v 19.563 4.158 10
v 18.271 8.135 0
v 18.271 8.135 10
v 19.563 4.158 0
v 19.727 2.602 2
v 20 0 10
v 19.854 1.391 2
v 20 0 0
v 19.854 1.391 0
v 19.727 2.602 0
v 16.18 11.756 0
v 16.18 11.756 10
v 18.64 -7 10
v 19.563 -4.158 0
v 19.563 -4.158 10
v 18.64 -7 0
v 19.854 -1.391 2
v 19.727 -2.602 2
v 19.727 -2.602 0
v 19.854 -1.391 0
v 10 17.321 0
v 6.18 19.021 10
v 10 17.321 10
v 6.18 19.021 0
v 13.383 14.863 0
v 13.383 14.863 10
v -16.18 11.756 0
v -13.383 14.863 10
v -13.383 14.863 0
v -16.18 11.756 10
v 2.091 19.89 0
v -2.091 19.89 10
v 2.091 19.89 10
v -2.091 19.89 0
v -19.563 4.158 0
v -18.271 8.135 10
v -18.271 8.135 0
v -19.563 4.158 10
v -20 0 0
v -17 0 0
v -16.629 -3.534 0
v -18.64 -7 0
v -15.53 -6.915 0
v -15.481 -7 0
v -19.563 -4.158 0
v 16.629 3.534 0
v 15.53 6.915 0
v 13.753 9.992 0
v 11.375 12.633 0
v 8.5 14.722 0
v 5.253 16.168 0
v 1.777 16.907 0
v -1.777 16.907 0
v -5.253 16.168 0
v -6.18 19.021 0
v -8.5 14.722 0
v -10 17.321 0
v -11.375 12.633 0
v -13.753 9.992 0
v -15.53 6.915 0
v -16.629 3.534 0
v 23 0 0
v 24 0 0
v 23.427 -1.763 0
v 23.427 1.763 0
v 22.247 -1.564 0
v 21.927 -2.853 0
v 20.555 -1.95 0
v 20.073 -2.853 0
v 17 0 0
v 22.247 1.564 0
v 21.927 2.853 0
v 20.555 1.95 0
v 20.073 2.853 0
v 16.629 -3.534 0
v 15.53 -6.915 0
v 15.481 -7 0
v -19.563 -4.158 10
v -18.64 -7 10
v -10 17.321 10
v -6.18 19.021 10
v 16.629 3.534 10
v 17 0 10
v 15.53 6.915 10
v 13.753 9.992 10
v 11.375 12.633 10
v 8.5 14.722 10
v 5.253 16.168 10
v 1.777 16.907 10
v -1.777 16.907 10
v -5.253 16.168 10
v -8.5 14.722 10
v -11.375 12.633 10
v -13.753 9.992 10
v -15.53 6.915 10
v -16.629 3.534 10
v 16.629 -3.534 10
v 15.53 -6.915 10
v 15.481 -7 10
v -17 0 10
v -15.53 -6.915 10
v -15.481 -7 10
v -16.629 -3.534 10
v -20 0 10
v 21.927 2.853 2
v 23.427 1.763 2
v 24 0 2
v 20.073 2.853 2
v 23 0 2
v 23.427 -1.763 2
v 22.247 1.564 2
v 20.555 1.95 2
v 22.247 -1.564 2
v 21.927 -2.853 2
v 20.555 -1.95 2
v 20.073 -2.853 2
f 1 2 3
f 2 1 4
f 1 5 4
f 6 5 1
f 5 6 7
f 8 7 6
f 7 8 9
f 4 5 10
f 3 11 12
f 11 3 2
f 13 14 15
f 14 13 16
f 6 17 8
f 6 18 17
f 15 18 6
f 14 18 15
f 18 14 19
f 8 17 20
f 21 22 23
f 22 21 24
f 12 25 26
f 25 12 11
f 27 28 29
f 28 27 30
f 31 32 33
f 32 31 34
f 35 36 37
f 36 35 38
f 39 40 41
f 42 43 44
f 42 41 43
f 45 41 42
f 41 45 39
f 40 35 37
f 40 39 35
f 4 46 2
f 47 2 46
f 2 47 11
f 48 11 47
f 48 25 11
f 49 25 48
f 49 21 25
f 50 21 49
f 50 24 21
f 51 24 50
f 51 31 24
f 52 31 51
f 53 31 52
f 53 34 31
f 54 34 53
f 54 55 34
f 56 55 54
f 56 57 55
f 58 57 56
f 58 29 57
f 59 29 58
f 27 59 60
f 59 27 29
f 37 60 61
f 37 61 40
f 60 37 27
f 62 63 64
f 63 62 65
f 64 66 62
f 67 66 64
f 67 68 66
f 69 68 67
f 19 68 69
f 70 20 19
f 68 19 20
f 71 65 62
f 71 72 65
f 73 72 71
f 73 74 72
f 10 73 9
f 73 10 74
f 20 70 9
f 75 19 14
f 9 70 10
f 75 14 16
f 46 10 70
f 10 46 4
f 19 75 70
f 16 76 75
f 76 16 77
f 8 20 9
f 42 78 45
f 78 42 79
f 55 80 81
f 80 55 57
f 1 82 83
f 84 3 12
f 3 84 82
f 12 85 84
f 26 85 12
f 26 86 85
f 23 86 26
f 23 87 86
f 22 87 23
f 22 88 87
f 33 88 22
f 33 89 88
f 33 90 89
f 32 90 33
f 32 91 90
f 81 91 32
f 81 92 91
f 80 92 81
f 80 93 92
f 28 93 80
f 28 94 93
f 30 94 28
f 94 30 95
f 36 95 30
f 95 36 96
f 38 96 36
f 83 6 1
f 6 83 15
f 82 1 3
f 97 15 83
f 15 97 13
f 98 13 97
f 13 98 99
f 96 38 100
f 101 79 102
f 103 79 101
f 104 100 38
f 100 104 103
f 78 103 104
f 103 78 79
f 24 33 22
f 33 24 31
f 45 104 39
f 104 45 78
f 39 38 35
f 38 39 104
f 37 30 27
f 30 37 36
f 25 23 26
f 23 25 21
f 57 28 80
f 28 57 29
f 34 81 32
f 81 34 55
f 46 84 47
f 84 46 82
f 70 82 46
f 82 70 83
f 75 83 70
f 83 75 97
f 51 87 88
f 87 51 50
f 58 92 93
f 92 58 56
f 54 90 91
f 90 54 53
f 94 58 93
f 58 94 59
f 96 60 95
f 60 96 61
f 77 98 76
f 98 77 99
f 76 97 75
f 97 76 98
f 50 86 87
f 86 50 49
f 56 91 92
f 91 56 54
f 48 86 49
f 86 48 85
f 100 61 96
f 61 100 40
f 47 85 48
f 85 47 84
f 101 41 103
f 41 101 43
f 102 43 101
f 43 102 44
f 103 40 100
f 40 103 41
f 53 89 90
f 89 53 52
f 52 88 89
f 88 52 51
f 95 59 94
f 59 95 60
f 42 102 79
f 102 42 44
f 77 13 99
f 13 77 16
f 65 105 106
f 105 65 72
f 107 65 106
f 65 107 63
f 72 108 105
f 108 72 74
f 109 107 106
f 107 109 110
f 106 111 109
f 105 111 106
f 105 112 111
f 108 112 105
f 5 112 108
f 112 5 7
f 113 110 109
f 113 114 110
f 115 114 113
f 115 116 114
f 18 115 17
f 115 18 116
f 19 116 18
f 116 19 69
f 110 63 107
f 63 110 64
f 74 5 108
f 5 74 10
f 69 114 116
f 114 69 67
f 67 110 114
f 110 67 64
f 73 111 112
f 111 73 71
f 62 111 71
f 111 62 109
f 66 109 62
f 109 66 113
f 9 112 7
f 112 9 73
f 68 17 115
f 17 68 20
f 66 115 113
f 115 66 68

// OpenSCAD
r = 17;
dr = 3;
h = 10;
difference(){
    cylinder(h=h,r=r+dr);
    translate([0,0,-1]) cylinder(h=h+2,r=r);
    translate([0,-17,2]) cube([40,20,2*h+2],true);
}
translate([r+dr+1,0,0])
    difference() {
        cylinder(h=2,r=3);
        translate([0,0,-1])cylinder(h=4,r=2);
    }
